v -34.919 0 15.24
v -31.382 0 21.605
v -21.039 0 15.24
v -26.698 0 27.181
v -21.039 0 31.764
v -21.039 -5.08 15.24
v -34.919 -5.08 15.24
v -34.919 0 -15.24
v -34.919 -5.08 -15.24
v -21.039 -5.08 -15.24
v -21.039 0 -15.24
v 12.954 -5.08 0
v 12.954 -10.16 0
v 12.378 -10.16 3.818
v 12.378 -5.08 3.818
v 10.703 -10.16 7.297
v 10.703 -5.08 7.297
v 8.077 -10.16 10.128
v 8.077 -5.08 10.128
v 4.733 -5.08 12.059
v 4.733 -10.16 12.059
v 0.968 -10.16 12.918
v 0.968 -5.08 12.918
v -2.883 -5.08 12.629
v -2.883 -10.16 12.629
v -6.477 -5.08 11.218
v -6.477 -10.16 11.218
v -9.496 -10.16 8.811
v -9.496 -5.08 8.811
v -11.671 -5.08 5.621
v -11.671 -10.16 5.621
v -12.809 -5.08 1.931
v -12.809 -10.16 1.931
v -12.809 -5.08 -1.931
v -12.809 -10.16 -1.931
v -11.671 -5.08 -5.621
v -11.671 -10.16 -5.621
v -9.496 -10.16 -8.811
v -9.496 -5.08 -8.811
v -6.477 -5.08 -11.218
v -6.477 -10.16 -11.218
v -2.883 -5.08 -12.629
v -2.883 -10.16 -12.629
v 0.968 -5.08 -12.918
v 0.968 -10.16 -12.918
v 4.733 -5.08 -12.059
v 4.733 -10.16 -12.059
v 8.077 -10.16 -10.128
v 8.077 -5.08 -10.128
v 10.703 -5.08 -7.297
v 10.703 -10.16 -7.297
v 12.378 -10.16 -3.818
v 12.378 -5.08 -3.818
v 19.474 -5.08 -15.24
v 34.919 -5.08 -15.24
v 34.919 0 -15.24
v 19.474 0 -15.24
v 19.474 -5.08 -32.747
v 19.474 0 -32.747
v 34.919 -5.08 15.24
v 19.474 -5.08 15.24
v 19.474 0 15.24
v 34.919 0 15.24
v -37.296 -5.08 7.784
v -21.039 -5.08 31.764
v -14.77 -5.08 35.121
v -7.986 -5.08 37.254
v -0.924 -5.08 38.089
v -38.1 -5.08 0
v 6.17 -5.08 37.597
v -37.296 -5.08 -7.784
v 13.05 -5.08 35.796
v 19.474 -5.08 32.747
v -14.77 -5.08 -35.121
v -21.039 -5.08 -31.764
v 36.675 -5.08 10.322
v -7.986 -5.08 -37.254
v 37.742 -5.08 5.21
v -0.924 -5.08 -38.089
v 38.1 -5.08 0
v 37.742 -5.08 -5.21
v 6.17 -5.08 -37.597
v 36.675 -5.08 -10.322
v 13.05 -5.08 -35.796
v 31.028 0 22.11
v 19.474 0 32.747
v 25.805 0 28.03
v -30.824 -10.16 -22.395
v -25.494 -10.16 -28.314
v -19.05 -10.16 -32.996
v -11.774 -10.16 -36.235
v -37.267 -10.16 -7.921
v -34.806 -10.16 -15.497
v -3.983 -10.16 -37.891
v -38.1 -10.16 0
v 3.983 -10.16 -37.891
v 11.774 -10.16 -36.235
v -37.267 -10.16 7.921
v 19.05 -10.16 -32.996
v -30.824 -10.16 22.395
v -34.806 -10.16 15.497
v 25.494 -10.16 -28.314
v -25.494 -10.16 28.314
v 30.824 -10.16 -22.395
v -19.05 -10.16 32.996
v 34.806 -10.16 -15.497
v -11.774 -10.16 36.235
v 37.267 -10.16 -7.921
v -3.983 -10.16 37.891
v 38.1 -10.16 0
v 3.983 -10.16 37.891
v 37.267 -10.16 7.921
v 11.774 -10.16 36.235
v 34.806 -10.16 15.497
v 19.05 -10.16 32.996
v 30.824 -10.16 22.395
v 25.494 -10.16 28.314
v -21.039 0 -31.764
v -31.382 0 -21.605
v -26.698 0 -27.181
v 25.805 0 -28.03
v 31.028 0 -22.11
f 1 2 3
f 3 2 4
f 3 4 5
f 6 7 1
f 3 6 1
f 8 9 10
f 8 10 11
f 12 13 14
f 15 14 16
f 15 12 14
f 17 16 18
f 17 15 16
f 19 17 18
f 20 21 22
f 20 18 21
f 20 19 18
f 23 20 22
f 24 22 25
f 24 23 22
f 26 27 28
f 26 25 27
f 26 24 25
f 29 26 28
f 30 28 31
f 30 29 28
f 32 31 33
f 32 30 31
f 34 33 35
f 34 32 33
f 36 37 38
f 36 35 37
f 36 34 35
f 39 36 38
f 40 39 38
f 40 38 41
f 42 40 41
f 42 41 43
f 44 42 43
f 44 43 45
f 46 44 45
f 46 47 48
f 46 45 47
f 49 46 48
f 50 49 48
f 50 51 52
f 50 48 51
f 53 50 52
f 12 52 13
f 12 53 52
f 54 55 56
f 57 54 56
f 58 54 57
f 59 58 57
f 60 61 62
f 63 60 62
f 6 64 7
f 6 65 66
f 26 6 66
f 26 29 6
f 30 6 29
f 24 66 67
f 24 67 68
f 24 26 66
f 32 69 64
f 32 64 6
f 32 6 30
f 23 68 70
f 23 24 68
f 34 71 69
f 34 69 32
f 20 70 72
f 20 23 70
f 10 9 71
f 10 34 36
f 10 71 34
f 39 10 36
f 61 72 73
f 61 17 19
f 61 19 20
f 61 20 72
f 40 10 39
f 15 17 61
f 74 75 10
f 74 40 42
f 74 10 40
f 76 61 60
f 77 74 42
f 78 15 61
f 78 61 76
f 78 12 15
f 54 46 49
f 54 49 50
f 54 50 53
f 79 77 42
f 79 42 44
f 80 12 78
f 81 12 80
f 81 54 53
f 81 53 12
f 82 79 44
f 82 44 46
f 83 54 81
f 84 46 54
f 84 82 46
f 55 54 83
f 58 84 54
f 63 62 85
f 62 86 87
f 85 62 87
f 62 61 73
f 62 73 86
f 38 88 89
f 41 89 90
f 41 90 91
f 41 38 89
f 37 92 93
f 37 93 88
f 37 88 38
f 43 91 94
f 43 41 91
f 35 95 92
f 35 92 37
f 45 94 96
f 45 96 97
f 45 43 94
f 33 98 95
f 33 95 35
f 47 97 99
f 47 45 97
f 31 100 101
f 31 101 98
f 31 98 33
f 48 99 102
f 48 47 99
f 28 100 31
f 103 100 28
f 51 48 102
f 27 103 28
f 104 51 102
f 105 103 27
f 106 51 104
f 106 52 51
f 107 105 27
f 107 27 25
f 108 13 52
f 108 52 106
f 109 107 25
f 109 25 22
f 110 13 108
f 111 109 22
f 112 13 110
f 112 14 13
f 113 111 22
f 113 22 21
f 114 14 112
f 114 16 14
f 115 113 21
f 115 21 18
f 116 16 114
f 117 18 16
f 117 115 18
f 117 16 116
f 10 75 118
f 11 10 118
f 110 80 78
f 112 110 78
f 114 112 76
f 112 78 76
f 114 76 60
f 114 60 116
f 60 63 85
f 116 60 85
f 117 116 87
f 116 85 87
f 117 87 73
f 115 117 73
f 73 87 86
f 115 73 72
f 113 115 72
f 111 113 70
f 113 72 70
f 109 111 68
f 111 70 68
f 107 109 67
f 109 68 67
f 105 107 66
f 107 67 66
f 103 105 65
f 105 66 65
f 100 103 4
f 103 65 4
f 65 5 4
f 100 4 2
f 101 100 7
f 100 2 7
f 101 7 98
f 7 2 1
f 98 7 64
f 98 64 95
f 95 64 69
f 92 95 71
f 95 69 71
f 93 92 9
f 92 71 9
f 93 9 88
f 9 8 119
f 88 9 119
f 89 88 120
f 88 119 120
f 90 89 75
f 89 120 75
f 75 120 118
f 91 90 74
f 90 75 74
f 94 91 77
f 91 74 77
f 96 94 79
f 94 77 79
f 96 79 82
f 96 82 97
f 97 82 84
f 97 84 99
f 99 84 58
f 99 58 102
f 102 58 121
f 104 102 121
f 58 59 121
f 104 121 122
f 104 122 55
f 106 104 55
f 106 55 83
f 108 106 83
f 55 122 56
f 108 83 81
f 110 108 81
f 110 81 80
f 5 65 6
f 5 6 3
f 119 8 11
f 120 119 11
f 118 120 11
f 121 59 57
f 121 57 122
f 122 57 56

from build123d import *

# Parameters (mm, degrees)
F0_R          = 12.7
F1_DEPTH      = 17.78
F2_R          = 38.1
F3_DEPTH      = 10.16
F4_R          = 12.954
F5_DEPTH      = 17.781
F5_DEPTH_BACK = 115
F6_W          = 5.08
F6_H          = 30.48
F7_DEPTH      = 38.101
F7_DEPTH_BACK = 38.101
F8_W          = 40.513
F8_H          = 5.08
F9_DEPTH      = 38.101
F9_DEPTH_BACK = 38.101


# Not quite as in the source:
# - an extrude ends at something that could not be found from the text; its depth is read off the source's solid


with BuildPart() as f1:
    # F0 (on Front) → F1 (new body)
    with BuildSketch(Plane.XZ):
        Circle(F0_R)
    extrude(amount=F1_DEPTH)

    # F2 (on Front) → F3 (join)
    with BuildSketch(Plane.XZ):
        Circle(F2_R)
    extrude(amount=F3_DEPTH)

    # F4 (on Front) → F5 (cut, two sides)
    with BuildSketch(Plane.XZ) as f5_sk:
        Circle(F4_R)
    extrude(amount=F5_DEPTH, mode=Mode.SUBTRACT)
    extrude(f5_sk.sketch, amount=-F5_DEPTH_BACK, mode=Mode.SUBTRACT)

    # F6 (on Right) → F7 (cut, two sides)
    with BuildSketch(Plane.YZ) as f7_sk:
        with Locations((-2.54, 0)):
            Rectangle(F6_W, F6_H)
    extrude(amount=F7_DEPTH, mode=Mode.SUBTRACT)
    extrude(f7_sk.sketch, amount=-F7_DEPTH_BACK, mode=Mode.SUBTRACT)

    # F8 (on Top) → F9 (cut, two sides)
    with BuildSketch(Plane.XY) as f9_sk:
        with Locations((-0.7823046945, -2.54)):
            Rectangle(F8_W, F8_H)
    extrude(amount=-F9_DEPTH, mode=Mode.SUBTRACT)
    extrude(f9_sk.sketch, amount=F9_DEPTH_BACK, mode=Mode.SUBTRACT)


solid = f1.part
